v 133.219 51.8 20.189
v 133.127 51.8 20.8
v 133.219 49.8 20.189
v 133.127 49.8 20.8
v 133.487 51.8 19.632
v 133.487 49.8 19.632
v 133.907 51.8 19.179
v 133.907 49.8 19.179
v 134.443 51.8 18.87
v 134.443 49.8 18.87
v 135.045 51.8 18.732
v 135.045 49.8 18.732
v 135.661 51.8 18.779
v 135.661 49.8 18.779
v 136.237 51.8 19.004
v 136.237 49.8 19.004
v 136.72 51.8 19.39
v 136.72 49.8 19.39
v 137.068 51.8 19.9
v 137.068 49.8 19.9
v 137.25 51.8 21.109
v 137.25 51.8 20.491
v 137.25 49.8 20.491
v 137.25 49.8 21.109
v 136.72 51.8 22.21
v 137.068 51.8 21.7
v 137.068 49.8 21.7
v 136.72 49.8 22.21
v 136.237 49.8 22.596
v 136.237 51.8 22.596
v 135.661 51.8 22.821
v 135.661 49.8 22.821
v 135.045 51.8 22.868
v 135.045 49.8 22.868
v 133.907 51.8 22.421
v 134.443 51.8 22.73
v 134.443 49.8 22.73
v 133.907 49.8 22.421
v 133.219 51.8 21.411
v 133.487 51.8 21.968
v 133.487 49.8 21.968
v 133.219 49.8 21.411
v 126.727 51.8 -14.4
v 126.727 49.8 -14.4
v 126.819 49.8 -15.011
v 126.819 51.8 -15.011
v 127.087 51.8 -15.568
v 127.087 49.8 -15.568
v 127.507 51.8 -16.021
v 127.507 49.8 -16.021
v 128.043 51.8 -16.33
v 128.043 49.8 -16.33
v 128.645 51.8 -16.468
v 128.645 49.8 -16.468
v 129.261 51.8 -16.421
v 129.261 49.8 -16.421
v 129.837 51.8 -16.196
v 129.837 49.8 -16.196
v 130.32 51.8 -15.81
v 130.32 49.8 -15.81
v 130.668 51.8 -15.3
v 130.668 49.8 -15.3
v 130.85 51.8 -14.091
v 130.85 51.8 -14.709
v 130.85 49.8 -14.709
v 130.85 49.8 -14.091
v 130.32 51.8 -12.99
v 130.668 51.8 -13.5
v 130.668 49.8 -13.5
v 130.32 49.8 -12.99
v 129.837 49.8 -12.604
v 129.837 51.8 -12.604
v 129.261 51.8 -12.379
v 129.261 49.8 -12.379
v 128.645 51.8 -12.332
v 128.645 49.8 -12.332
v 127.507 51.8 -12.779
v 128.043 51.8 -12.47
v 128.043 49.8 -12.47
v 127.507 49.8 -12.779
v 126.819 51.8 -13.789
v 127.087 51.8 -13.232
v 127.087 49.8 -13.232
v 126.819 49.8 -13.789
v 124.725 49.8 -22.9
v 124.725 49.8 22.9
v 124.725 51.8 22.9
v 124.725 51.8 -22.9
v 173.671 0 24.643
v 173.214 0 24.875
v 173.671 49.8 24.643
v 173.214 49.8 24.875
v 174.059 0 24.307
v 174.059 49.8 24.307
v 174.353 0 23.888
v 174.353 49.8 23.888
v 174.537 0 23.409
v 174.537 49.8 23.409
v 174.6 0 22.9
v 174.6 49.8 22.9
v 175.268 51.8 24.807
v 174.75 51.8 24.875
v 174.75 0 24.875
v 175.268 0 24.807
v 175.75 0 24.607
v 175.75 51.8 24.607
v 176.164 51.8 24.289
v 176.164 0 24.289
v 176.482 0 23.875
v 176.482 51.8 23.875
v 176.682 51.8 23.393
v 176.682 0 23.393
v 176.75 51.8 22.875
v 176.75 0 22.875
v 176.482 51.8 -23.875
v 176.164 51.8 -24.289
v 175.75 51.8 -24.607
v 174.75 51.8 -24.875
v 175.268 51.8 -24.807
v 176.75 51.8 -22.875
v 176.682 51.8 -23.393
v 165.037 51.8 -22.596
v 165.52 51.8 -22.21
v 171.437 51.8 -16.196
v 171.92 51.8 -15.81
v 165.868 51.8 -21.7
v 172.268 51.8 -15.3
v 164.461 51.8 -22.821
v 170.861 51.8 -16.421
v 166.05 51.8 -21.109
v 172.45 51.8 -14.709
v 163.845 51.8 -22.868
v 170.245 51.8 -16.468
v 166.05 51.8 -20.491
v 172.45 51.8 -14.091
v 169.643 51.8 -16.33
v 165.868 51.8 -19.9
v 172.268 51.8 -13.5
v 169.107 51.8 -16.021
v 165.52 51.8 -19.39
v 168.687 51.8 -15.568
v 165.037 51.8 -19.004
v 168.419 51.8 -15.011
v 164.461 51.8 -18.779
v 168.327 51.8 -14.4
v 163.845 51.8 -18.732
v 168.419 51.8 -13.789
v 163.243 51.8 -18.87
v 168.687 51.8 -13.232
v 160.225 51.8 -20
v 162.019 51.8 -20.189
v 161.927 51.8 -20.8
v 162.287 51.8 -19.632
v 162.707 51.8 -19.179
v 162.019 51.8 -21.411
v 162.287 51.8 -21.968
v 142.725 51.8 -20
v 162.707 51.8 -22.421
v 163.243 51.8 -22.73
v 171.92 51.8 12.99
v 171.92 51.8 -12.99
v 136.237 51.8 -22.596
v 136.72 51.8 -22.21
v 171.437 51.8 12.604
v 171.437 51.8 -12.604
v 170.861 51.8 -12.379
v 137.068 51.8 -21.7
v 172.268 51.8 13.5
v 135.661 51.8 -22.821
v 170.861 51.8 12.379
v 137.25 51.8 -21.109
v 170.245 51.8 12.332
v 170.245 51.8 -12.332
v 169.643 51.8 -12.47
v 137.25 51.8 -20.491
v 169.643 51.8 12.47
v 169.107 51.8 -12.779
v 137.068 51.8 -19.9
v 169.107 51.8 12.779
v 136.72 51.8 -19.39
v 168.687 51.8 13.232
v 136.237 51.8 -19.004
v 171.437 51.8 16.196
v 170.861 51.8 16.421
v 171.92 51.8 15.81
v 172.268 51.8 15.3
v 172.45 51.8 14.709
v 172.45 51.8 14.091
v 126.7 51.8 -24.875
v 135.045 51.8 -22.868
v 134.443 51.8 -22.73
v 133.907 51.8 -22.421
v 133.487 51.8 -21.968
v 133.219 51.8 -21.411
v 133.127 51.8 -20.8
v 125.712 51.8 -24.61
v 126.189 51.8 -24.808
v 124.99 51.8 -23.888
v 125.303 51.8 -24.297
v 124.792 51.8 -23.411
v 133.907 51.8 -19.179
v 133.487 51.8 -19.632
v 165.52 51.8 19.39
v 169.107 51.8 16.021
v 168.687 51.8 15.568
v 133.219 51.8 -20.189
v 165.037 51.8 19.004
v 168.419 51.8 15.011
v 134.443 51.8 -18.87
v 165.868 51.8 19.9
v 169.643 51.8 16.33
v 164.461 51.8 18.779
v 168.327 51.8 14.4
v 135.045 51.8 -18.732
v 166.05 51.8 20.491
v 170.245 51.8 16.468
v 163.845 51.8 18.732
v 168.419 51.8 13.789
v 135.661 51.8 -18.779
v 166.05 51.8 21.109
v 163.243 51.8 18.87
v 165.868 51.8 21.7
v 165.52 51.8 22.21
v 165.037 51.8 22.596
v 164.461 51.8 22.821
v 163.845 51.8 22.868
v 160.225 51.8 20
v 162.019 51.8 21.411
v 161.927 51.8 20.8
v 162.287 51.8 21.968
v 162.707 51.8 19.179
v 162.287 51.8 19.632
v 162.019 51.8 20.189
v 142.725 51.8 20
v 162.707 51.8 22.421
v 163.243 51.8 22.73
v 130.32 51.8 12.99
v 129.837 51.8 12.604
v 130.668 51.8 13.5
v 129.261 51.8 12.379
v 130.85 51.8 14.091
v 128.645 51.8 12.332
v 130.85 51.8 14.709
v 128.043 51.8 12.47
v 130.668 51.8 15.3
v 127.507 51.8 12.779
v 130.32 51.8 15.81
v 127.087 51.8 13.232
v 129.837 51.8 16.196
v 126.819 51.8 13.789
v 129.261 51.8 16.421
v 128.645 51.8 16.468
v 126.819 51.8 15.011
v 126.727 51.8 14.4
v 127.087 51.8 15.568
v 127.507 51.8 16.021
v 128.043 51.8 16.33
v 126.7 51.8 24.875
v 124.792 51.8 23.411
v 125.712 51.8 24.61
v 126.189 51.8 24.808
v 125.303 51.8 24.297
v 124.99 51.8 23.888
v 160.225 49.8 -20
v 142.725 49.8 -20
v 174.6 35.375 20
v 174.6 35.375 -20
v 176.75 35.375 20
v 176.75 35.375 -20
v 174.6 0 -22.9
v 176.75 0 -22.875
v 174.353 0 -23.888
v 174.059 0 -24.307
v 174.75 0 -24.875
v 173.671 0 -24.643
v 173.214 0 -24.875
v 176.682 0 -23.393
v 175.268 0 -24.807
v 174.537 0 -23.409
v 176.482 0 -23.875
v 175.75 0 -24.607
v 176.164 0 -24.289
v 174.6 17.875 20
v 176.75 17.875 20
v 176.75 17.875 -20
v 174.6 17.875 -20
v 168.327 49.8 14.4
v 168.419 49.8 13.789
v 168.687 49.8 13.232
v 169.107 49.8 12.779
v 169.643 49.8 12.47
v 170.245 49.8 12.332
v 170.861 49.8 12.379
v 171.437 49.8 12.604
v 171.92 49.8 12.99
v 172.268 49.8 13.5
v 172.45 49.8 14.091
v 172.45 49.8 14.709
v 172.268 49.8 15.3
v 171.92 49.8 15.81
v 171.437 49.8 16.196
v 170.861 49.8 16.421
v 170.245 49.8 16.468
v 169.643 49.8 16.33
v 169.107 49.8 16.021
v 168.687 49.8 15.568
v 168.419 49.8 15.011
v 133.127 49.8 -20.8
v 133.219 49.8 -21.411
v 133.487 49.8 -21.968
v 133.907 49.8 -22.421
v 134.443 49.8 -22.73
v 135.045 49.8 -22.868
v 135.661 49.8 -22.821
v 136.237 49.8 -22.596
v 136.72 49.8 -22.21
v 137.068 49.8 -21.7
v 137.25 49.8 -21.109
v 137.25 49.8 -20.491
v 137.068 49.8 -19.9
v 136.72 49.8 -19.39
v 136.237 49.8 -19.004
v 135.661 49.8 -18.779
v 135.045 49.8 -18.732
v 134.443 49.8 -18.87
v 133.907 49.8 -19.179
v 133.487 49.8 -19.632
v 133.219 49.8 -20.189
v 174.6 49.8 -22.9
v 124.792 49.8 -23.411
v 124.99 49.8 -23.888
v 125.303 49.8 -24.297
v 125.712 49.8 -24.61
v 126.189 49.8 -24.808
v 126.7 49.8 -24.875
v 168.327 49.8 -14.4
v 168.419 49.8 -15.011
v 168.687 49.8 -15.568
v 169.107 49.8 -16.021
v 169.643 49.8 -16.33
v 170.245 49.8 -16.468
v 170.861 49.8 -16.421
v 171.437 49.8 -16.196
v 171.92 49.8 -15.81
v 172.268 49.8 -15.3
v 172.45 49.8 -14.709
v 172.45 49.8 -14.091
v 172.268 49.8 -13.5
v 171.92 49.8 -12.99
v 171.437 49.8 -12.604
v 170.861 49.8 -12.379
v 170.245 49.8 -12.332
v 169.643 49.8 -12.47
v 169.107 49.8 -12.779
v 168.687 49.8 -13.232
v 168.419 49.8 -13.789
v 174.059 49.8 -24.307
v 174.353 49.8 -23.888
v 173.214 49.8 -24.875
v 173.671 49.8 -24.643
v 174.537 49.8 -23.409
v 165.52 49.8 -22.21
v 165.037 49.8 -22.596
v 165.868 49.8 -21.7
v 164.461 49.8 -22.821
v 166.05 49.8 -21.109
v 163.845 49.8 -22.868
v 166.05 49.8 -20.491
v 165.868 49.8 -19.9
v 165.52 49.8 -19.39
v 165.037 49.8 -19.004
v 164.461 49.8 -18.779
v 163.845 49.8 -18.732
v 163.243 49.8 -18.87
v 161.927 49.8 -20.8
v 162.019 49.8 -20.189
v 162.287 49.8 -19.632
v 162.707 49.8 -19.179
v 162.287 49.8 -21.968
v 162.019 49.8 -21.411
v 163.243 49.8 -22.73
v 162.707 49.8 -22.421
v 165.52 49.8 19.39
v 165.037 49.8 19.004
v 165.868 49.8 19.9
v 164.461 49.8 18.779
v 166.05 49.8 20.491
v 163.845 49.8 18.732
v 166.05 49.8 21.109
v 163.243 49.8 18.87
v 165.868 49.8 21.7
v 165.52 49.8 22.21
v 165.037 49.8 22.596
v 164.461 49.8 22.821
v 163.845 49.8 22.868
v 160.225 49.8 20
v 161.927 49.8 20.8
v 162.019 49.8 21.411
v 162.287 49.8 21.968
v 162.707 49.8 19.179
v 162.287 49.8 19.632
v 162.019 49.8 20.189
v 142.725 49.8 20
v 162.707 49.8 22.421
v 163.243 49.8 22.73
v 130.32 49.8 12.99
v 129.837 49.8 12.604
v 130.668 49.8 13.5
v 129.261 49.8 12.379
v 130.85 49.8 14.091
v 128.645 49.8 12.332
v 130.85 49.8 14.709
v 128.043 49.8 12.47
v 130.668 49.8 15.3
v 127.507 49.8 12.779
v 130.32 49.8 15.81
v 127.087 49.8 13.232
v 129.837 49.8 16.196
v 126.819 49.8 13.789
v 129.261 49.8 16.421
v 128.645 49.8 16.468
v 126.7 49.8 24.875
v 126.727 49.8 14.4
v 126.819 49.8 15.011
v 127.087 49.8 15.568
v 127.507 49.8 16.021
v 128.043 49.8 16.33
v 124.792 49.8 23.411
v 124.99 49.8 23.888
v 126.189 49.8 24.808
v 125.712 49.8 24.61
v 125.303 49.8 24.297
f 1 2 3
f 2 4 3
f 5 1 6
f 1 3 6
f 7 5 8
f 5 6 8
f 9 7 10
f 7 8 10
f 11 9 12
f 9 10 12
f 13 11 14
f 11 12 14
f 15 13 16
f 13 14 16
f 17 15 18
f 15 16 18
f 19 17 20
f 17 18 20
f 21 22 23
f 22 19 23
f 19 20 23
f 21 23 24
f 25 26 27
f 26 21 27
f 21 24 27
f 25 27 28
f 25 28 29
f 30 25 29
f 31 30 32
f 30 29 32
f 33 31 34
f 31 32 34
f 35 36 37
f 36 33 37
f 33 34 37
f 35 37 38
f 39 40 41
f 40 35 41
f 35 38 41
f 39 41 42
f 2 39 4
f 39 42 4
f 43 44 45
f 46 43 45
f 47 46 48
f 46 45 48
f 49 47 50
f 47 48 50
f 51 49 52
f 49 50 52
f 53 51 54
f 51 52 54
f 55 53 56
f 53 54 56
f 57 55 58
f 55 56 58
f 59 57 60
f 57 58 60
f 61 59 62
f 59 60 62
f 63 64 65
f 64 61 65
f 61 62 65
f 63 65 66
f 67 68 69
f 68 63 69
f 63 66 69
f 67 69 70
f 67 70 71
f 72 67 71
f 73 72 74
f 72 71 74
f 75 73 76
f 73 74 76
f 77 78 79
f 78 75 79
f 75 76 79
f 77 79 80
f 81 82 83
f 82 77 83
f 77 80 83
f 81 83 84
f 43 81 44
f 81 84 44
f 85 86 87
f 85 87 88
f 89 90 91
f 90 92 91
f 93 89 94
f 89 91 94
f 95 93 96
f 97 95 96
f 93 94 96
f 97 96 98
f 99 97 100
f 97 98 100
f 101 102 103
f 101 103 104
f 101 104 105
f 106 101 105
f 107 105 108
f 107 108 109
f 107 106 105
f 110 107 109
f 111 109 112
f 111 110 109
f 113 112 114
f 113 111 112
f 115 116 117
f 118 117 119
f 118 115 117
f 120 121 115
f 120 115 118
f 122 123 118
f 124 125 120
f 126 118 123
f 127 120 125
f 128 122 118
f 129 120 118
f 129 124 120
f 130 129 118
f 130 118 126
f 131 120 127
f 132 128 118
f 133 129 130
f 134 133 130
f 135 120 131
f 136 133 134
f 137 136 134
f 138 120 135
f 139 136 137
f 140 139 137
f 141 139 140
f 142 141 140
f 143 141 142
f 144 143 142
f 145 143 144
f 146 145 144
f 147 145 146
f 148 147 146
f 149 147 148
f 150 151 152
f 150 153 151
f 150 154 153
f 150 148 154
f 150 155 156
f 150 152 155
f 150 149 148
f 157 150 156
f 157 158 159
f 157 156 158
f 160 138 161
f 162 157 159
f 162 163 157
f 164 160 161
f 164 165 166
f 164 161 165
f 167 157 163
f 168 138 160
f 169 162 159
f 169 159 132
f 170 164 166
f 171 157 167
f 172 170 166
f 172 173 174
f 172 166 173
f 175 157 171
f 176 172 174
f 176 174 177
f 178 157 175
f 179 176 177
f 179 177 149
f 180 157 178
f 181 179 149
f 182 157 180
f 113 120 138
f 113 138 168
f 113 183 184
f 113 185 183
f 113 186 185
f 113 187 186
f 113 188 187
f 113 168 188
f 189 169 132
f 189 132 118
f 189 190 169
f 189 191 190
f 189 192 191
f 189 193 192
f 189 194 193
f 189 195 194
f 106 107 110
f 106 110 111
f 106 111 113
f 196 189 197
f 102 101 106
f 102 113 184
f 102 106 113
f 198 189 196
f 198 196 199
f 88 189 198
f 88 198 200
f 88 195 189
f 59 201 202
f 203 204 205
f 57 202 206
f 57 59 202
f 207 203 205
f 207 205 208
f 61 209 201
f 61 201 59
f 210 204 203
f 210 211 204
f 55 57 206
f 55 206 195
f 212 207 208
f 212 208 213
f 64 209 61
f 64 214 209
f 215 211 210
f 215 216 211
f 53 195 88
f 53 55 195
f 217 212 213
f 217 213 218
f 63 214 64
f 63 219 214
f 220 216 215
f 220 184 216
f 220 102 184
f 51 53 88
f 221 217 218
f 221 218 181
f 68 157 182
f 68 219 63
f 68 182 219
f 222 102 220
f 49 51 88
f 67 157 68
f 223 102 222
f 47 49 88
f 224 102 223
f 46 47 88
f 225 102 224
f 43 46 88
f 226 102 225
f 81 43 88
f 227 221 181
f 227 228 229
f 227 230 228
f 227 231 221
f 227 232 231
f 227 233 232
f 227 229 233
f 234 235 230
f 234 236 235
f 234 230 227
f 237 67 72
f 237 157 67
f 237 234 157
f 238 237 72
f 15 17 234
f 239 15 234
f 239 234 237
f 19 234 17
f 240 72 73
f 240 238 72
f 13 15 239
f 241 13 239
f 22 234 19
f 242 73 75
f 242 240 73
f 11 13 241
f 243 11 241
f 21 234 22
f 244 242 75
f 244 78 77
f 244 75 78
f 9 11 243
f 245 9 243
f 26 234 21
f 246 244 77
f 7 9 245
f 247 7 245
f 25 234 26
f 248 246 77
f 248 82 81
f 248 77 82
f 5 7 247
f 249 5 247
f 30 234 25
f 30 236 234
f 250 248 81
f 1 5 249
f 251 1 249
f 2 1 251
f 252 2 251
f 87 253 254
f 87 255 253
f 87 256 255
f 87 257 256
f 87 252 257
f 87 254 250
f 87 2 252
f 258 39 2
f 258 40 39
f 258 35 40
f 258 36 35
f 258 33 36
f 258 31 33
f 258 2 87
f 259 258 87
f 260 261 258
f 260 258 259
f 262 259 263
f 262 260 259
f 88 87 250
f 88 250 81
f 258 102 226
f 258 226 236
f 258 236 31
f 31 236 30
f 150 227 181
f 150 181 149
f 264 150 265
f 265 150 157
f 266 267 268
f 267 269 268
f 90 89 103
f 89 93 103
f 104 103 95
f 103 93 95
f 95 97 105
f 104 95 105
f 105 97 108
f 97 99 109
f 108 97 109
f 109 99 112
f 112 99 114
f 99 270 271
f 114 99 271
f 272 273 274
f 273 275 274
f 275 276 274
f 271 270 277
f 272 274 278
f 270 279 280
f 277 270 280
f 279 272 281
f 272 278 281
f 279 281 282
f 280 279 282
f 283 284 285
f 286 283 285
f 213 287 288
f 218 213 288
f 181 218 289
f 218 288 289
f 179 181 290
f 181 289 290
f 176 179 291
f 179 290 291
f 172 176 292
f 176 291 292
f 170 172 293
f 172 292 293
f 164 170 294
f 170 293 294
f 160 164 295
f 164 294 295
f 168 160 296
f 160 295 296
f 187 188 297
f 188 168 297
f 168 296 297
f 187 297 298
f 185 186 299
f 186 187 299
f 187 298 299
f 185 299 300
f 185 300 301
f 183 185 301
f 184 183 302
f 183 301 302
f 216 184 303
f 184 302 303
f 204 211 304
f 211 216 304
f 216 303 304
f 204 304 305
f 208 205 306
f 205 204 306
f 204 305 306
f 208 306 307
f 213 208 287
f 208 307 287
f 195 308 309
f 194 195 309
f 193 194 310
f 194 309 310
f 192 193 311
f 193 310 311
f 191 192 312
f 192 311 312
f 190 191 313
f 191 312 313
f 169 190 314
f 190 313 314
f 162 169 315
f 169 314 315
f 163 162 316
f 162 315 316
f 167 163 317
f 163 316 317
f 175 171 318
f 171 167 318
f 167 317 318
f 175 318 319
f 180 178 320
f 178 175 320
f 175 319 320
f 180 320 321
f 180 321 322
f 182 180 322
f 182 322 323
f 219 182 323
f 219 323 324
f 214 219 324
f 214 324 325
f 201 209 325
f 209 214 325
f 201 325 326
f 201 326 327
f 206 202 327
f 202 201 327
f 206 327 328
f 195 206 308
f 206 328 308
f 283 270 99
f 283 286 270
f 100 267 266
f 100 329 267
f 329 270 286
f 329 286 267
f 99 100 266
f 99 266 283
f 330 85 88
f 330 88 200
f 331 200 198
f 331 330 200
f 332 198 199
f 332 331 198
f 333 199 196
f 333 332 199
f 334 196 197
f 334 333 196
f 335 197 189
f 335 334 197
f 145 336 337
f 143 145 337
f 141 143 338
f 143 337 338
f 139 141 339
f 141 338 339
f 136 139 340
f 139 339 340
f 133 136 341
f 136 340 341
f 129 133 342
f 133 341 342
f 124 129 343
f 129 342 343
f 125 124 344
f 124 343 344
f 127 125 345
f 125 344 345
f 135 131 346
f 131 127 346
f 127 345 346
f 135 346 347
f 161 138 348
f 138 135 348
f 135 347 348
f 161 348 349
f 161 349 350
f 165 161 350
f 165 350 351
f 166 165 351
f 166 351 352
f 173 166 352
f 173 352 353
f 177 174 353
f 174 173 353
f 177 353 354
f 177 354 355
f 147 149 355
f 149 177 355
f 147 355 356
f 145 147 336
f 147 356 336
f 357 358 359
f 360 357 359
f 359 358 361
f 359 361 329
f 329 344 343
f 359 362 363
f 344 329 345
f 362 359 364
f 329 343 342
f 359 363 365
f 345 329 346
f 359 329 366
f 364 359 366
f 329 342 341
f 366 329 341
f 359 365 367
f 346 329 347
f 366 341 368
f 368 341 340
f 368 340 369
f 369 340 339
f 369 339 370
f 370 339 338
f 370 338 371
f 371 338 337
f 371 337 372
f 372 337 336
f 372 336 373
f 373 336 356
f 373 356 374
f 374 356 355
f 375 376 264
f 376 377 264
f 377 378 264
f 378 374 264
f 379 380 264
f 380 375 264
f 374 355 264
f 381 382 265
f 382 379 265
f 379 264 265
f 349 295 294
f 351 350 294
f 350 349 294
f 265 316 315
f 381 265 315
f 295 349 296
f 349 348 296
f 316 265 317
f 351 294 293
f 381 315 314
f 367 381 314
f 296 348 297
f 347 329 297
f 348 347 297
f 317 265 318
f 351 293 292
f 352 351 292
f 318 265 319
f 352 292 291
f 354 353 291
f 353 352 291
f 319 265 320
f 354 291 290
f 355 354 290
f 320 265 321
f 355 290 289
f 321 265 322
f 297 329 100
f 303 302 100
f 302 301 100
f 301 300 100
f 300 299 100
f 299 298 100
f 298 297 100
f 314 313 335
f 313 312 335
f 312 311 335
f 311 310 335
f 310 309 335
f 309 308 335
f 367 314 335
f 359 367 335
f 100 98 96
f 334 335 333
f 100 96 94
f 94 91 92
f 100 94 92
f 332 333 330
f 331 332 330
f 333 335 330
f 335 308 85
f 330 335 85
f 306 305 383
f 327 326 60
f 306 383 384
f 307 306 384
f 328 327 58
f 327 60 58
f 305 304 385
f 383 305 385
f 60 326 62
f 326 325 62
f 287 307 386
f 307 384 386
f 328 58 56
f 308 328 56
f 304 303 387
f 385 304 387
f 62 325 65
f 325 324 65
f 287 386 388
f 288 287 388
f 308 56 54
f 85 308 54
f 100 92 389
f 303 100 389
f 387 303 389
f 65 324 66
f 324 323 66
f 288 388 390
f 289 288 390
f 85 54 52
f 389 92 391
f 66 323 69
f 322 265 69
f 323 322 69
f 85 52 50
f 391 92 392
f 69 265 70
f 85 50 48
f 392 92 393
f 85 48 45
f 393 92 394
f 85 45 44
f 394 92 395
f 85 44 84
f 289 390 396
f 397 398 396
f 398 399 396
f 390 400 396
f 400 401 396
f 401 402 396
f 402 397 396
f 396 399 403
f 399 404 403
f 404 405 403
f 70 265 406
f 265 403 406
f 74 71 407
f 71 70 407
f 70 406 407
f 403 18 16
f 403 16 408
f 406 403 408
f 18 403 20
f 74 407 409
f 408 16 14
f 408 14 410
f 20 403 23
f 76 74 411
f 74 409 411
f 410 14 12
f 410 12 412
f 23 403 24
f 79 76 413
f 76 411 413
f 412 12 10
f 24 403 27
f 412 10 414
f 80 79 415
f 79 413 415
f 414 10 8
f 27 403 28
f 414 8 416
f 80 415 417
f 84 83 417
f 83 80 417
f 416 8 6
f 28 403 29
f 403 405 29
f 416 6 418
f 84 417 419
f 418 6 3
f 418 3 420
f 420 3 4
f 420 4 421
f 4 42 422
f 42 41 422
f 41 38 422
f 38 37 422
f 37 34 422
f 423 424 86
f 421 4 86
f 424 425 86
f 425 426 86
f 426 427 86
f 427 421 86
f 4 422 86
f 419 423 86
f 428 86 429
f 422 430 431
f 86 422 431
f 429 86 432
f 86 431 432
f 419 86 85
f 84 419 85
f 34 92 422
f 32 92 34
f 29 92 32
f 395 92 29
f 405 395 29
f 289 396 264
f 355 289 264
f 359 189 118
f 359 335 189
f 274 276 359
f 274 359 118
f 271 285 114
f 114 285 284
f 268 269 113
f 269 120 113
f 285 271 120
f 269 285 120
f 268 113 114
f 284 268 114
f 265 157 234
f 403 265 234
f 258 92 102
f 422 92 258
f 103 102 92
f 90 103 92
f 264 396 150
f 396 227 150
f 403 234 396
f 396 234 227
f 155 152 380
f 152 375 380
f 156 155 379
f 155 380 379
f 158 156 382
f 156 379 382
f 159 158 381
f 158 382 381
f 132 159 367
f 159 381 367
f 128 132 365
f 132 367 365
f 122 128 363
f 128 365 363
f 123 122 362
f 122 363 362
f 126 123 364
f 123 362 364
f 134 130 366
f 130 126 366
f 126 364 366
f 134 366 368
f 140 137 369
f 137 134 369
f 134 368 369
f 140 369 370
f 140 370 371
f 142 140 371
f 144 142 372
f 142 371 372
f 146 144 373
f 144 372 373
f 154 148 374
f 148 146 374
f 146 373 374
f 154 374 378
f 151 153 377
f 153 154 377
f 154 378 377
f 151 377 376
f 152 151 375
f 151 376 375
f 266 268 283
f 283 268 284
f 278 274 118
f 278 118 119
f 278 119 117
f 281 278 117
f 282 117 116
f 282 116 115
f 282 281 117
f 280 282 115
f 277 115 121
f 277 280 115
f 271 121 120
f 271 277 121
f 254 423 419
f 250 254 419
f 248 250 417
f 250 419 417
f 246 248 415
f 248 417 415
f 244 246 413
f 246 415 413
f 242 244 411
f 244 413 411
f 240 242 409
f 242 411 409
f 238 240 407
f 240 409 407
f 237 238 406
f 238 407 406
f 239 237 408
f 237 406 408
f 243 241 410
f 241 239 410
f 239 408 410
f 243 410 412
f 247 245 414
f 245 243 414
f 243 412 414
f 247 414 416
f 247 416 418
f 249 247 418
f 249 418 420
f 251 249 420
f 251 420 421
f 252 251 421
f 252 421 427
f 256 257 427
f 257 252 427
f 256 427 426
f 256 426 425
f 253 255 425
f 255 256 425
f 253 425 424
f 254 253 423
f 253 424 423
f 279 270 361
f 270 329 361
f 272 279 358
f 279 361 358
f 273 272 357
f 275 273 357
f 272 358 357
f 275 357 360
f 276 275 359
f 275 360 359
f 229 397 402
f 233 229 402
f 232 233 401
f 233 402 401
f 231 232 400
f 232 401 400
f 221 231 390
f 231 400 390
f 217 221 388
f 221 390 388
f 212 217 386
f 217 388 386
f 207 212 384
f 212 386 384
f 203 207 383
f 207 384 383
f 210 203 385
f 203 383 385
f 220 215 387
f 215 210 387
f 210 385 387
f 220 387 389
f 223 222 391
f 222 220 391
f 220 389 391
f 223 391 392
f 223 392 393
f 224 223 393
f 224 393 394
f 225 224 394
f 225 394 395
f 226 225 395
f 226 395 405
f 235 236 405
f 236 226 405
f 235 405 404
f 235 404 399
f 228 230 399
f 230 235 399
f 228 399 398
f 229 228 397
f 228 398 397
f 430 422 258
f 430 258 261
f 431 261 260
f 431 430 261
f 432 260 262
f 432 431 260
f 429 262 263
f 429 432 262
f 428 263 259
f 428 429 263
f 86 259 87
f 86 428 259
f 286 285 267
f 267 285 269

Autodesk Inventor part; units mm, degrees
ref_plane "YZ Plane" through (0, 0, 0) normal (1, 0, 0) x (0, 1, 0)
ref_plane "XZ Plane" through (0, 0, 0) normal (0, 1, 0) x (-1, 0, 0)
sketch "Sketch1" plane through (0, 0, 0) normal (0, 1, 0) x (-1, 0, 0)
  line L0 (-155.225, -15) -> (-155.225, 15) projected
  line L1 (-155.225, 15) -> (-147.725, 15) projected
  line L2 (-147.725, 15) -> (-147.725, -15) projected
  line L3 (-147.725, -15) -> (-155.225, -15) projected
  circle A0 centre (-171.5, -21.9) radius 1.875 projected
  circle A1 centre (-127.7, 21.9) radius 1.875 projected
  circle A2 centre (-127.7, -21.9) radius 1.875 projected
  circle A3 centre (-171.5, 21.9) radius 1.875 projected
  circle A4 centre (-135.2, 20.8) radius 2.0734 projected
  circle A5 centre (-164, -20.8) radius 2.0734 projected
  circle A6 centre (-135.2, -20.8) radius 2.0734 projected
  circle A7 centre (-128.8, -14.4) radius 2.0734 projected
  circle A8 centre (-128.8, 14.4) radius 2.0734 projected
  circle A9 centre (-164, 20.8) radius 2.0734 projected
  circle A10 centre (-170.4, -14.4) radius 2.0734 projected
  circle A11 centre (-170.4, 14.4) radius 2.0734 projected
  line L4 (-172.5, 24.875) -> (-126.7, 24.875) projected
  arc A12 (-172.5, 24.875) -> (-174.475, 22.9) centre (-172.5, 22.9) ccw projected
  line L5 (-174.475, -22.9) -> (-174.475, 22.9) projected
  arc A13 (-174.475, -22.9) -> (-172.5, -24.875) centre (-172.5, -22.9) ccw projected
  line L6 (-126.7, -24.875) -> (-172.5, -24.875) projected
  arc A14 (-126.7, -24.875) -> (-124.725, -22.9) centre (-126.7, -22.9) ccw projected
  line L7 (-124.725, 22.9) -> (-124.725, -22.9) projected
  arc A15 (-124.725, 22.9) -> (-126.7, 24.875) centre (-126.7, 22.9) ccw projected
  point P0 (0, 0)
ref_plane "Work Plane1" through (124.725, 49.8, -24.875) normal (0, 1, 0) x (0, 0, 1)
extrude "Extrusion1" add sketch "Sketch1" along normal blind 2 from surface at 49.8 contours A0 | A1 | A2 | A3 | L4 A15 L7 A14 L6 A13 L5 A12
sketch "Sketch2" plane through (126.7, 51.8, -24.875) normal (0, 1, 0) x (1, 0, 0)
  line L0 (28.525, -9.875) -> (21.025, -9.875) projected
  line L1 (28.525, -39.875) -> (28.525, -9.875) projected
  line L2 (21.025, -39.875) -> (28.525, -39.875) projected
  line L3 (21.025, -9.875) -> (21.025, -39.875) projected
  circle A0 centre (8.5, -45.675) radius 2.0734 projected
  circle A1 centre (37.3, -4.075) radius 2.0734 projected
  circle A2 centre (8.5, -4.075) radius 2.0734 projected
  circle A3 centre (2.1, -10.475) radius 2.0734 projected
  circle A4 centre (2.1, -39.275) radius 2.0734 projected
  circle A5 centre (37.3, -45.675) radius 2.0734 projected
  circle A6 centre (43.7, -10.475) radius 2.0734 projected
  circle A7 centre (43.7, -39.275) radius 2.0734 projected
  arc A8 (47.775, -1.975) -> (45.8, 0) centre (45.8, -1.975) ccw projected
  line L4 (0, 0) -> (45.8, 0) projected
  arc A9 (0, 0) -> (-1.975, -1.975) centre (0, -1.975) ccw projected
  line L5 (-1.975, -47.775) -> (-1.975, -1.975) projected
  arc A10 (-1.975, -47.775) -> (0, -49.75) centre (0, -47.775) ccw projected
  line L6 (45.8, -49.75) -> (0, -49.75) projected
  arc A11 (45.8, -49.75) -> (47.775, -47.775) centre (45.8, -47.775) ccw projected
  line L7 (47.775, -1.975) -> (47.775, -47.775) projected
  line L8 (16.025, -44.875) -> (33.525, -44.875)
  line L9 (33.525, -44.875) -> (33.525, -4.875)
  line L10 (33.525, -4.875) -> (16.025, -4.875)
  line L11 (16.025, -4.875) -> (16.025, -44.875)
  line L12 (45.8, 0) -> (50.05, 0)
  line L13 (50.05, 0) -> (50.05, -49.75)
  line L14 (50.05, -49.75) -> (45.8, -49.75)
  line L15 (45.8, -49.75) -> (45.8, 0)
  line L16 (50.05, -49.75) -> (47.925, -49.75)
  line L17 (47.925, -49.75) -> (47.925, 0)
  line L18 (47.925, 0) -> (50.05, 0)
  line L19 (50.05, 0) -> (50.05, -49.75)
  arc A12 (45.8, -49.875) -> (47.9, -47.775) centre (45.8, -47.775) ccw
  line L20 (45.8, -49.875) -> (0, -49.875)
  arc A13 (-2.1, -47.775) -> (0, -49.875) centre (0, -47.775) ccw
  line L21 (-2.1, -47.775) -> (-2.1, -1.975)
  arc A14 (0, 0.125) -> (-2.1, -1.975) centre (0, -1.975) ccw
  line L22 (0, 0.125) -> (45.8, 0.125)
  arc A15 (47.9, -1.975) -> (45.8, 0.125) centre (45.8, -1.975) ccw
  line L23 (47.9, -1.975) -> (47.9, -47.775)
  point P0 (-126.7, -24.875)
  point P1 (47.925, -49.75)
  point P2 (46.5137, -49.75)
  point P3 (46.5137, 0)
  dimension "d2" = 5
  dimension "d3" = 4.25
  dimension "d4" = 2.125
  dimension "d15" = 0.125
extrude "Extrusion2" cut sketch "Sketch2" against normal up to surface (2 mm away) contours L11 L10 L9 L8
extrude "Extrusion3" add sketch "Sketch2" against normal blind 2 contours A8 L12 A15 L23 A12 L14 A11 L7 | L12 L17 L14 A12 L23 A15 | L12 L13 L14 L17
extrude "Extrusion4" add sketch "Sketch2" against normal blind 49.8 from surface at -2 contours L12 L17 L14 A12 L23 A15 | L12 L13 L14 L17
fillet "Fillet1" radius 2 2 edges at (176.75, 25.9, 24.875) (176.75, 25.9, -24.875)
sketch "Sketch3" plane through (176.75, 51.8, 22.875) normal (1, 0, 0) x (0, 0, -1)
  line L0 (7.875, -21.425) -> (7.875, -28.925) projected
  line L1 (7.875, -28.925) -> (37.875, -28.925) projected
  line L2 (37.875, -28.925) -> (37.875, -21.425) projected
  line L3 (37.875, -21.425) -> (7.875, -21.425) projected
  line L4 (5.825, -9.7) -> (39.925, -9.7) projected
  line L5 (39.925, -44.1) -> (39.925, -9.7) projected
  line L6 (5.825, -44.1) -> (39.925, -44.1) projected
  line L7 (5.825, -9.7) -> (5.825, -44.1) projected
  line L8 (2.875, -16.425) -> (2.875, -33.925)
  line L9 (2.875, -33.925) -> (42.875, -33.925)
  line L10 (42.875, -33.925) -> (42.875, -16.425)
  line L11 (42.875, -16.425) -> (2.875, -16.425)
  point P0 (22.875, -51.8)
  dimension "d12" = 5
extrude "Extrusion5" cut sketch "Sketch3" against normal up to surface (2.15 mm away) contours L3 L2 L1 L0 | L11 L5 L9 L7 | L7 L9 L8 L11 | L11 L10 L9 L5
properties part number "Lens Light Cover"
